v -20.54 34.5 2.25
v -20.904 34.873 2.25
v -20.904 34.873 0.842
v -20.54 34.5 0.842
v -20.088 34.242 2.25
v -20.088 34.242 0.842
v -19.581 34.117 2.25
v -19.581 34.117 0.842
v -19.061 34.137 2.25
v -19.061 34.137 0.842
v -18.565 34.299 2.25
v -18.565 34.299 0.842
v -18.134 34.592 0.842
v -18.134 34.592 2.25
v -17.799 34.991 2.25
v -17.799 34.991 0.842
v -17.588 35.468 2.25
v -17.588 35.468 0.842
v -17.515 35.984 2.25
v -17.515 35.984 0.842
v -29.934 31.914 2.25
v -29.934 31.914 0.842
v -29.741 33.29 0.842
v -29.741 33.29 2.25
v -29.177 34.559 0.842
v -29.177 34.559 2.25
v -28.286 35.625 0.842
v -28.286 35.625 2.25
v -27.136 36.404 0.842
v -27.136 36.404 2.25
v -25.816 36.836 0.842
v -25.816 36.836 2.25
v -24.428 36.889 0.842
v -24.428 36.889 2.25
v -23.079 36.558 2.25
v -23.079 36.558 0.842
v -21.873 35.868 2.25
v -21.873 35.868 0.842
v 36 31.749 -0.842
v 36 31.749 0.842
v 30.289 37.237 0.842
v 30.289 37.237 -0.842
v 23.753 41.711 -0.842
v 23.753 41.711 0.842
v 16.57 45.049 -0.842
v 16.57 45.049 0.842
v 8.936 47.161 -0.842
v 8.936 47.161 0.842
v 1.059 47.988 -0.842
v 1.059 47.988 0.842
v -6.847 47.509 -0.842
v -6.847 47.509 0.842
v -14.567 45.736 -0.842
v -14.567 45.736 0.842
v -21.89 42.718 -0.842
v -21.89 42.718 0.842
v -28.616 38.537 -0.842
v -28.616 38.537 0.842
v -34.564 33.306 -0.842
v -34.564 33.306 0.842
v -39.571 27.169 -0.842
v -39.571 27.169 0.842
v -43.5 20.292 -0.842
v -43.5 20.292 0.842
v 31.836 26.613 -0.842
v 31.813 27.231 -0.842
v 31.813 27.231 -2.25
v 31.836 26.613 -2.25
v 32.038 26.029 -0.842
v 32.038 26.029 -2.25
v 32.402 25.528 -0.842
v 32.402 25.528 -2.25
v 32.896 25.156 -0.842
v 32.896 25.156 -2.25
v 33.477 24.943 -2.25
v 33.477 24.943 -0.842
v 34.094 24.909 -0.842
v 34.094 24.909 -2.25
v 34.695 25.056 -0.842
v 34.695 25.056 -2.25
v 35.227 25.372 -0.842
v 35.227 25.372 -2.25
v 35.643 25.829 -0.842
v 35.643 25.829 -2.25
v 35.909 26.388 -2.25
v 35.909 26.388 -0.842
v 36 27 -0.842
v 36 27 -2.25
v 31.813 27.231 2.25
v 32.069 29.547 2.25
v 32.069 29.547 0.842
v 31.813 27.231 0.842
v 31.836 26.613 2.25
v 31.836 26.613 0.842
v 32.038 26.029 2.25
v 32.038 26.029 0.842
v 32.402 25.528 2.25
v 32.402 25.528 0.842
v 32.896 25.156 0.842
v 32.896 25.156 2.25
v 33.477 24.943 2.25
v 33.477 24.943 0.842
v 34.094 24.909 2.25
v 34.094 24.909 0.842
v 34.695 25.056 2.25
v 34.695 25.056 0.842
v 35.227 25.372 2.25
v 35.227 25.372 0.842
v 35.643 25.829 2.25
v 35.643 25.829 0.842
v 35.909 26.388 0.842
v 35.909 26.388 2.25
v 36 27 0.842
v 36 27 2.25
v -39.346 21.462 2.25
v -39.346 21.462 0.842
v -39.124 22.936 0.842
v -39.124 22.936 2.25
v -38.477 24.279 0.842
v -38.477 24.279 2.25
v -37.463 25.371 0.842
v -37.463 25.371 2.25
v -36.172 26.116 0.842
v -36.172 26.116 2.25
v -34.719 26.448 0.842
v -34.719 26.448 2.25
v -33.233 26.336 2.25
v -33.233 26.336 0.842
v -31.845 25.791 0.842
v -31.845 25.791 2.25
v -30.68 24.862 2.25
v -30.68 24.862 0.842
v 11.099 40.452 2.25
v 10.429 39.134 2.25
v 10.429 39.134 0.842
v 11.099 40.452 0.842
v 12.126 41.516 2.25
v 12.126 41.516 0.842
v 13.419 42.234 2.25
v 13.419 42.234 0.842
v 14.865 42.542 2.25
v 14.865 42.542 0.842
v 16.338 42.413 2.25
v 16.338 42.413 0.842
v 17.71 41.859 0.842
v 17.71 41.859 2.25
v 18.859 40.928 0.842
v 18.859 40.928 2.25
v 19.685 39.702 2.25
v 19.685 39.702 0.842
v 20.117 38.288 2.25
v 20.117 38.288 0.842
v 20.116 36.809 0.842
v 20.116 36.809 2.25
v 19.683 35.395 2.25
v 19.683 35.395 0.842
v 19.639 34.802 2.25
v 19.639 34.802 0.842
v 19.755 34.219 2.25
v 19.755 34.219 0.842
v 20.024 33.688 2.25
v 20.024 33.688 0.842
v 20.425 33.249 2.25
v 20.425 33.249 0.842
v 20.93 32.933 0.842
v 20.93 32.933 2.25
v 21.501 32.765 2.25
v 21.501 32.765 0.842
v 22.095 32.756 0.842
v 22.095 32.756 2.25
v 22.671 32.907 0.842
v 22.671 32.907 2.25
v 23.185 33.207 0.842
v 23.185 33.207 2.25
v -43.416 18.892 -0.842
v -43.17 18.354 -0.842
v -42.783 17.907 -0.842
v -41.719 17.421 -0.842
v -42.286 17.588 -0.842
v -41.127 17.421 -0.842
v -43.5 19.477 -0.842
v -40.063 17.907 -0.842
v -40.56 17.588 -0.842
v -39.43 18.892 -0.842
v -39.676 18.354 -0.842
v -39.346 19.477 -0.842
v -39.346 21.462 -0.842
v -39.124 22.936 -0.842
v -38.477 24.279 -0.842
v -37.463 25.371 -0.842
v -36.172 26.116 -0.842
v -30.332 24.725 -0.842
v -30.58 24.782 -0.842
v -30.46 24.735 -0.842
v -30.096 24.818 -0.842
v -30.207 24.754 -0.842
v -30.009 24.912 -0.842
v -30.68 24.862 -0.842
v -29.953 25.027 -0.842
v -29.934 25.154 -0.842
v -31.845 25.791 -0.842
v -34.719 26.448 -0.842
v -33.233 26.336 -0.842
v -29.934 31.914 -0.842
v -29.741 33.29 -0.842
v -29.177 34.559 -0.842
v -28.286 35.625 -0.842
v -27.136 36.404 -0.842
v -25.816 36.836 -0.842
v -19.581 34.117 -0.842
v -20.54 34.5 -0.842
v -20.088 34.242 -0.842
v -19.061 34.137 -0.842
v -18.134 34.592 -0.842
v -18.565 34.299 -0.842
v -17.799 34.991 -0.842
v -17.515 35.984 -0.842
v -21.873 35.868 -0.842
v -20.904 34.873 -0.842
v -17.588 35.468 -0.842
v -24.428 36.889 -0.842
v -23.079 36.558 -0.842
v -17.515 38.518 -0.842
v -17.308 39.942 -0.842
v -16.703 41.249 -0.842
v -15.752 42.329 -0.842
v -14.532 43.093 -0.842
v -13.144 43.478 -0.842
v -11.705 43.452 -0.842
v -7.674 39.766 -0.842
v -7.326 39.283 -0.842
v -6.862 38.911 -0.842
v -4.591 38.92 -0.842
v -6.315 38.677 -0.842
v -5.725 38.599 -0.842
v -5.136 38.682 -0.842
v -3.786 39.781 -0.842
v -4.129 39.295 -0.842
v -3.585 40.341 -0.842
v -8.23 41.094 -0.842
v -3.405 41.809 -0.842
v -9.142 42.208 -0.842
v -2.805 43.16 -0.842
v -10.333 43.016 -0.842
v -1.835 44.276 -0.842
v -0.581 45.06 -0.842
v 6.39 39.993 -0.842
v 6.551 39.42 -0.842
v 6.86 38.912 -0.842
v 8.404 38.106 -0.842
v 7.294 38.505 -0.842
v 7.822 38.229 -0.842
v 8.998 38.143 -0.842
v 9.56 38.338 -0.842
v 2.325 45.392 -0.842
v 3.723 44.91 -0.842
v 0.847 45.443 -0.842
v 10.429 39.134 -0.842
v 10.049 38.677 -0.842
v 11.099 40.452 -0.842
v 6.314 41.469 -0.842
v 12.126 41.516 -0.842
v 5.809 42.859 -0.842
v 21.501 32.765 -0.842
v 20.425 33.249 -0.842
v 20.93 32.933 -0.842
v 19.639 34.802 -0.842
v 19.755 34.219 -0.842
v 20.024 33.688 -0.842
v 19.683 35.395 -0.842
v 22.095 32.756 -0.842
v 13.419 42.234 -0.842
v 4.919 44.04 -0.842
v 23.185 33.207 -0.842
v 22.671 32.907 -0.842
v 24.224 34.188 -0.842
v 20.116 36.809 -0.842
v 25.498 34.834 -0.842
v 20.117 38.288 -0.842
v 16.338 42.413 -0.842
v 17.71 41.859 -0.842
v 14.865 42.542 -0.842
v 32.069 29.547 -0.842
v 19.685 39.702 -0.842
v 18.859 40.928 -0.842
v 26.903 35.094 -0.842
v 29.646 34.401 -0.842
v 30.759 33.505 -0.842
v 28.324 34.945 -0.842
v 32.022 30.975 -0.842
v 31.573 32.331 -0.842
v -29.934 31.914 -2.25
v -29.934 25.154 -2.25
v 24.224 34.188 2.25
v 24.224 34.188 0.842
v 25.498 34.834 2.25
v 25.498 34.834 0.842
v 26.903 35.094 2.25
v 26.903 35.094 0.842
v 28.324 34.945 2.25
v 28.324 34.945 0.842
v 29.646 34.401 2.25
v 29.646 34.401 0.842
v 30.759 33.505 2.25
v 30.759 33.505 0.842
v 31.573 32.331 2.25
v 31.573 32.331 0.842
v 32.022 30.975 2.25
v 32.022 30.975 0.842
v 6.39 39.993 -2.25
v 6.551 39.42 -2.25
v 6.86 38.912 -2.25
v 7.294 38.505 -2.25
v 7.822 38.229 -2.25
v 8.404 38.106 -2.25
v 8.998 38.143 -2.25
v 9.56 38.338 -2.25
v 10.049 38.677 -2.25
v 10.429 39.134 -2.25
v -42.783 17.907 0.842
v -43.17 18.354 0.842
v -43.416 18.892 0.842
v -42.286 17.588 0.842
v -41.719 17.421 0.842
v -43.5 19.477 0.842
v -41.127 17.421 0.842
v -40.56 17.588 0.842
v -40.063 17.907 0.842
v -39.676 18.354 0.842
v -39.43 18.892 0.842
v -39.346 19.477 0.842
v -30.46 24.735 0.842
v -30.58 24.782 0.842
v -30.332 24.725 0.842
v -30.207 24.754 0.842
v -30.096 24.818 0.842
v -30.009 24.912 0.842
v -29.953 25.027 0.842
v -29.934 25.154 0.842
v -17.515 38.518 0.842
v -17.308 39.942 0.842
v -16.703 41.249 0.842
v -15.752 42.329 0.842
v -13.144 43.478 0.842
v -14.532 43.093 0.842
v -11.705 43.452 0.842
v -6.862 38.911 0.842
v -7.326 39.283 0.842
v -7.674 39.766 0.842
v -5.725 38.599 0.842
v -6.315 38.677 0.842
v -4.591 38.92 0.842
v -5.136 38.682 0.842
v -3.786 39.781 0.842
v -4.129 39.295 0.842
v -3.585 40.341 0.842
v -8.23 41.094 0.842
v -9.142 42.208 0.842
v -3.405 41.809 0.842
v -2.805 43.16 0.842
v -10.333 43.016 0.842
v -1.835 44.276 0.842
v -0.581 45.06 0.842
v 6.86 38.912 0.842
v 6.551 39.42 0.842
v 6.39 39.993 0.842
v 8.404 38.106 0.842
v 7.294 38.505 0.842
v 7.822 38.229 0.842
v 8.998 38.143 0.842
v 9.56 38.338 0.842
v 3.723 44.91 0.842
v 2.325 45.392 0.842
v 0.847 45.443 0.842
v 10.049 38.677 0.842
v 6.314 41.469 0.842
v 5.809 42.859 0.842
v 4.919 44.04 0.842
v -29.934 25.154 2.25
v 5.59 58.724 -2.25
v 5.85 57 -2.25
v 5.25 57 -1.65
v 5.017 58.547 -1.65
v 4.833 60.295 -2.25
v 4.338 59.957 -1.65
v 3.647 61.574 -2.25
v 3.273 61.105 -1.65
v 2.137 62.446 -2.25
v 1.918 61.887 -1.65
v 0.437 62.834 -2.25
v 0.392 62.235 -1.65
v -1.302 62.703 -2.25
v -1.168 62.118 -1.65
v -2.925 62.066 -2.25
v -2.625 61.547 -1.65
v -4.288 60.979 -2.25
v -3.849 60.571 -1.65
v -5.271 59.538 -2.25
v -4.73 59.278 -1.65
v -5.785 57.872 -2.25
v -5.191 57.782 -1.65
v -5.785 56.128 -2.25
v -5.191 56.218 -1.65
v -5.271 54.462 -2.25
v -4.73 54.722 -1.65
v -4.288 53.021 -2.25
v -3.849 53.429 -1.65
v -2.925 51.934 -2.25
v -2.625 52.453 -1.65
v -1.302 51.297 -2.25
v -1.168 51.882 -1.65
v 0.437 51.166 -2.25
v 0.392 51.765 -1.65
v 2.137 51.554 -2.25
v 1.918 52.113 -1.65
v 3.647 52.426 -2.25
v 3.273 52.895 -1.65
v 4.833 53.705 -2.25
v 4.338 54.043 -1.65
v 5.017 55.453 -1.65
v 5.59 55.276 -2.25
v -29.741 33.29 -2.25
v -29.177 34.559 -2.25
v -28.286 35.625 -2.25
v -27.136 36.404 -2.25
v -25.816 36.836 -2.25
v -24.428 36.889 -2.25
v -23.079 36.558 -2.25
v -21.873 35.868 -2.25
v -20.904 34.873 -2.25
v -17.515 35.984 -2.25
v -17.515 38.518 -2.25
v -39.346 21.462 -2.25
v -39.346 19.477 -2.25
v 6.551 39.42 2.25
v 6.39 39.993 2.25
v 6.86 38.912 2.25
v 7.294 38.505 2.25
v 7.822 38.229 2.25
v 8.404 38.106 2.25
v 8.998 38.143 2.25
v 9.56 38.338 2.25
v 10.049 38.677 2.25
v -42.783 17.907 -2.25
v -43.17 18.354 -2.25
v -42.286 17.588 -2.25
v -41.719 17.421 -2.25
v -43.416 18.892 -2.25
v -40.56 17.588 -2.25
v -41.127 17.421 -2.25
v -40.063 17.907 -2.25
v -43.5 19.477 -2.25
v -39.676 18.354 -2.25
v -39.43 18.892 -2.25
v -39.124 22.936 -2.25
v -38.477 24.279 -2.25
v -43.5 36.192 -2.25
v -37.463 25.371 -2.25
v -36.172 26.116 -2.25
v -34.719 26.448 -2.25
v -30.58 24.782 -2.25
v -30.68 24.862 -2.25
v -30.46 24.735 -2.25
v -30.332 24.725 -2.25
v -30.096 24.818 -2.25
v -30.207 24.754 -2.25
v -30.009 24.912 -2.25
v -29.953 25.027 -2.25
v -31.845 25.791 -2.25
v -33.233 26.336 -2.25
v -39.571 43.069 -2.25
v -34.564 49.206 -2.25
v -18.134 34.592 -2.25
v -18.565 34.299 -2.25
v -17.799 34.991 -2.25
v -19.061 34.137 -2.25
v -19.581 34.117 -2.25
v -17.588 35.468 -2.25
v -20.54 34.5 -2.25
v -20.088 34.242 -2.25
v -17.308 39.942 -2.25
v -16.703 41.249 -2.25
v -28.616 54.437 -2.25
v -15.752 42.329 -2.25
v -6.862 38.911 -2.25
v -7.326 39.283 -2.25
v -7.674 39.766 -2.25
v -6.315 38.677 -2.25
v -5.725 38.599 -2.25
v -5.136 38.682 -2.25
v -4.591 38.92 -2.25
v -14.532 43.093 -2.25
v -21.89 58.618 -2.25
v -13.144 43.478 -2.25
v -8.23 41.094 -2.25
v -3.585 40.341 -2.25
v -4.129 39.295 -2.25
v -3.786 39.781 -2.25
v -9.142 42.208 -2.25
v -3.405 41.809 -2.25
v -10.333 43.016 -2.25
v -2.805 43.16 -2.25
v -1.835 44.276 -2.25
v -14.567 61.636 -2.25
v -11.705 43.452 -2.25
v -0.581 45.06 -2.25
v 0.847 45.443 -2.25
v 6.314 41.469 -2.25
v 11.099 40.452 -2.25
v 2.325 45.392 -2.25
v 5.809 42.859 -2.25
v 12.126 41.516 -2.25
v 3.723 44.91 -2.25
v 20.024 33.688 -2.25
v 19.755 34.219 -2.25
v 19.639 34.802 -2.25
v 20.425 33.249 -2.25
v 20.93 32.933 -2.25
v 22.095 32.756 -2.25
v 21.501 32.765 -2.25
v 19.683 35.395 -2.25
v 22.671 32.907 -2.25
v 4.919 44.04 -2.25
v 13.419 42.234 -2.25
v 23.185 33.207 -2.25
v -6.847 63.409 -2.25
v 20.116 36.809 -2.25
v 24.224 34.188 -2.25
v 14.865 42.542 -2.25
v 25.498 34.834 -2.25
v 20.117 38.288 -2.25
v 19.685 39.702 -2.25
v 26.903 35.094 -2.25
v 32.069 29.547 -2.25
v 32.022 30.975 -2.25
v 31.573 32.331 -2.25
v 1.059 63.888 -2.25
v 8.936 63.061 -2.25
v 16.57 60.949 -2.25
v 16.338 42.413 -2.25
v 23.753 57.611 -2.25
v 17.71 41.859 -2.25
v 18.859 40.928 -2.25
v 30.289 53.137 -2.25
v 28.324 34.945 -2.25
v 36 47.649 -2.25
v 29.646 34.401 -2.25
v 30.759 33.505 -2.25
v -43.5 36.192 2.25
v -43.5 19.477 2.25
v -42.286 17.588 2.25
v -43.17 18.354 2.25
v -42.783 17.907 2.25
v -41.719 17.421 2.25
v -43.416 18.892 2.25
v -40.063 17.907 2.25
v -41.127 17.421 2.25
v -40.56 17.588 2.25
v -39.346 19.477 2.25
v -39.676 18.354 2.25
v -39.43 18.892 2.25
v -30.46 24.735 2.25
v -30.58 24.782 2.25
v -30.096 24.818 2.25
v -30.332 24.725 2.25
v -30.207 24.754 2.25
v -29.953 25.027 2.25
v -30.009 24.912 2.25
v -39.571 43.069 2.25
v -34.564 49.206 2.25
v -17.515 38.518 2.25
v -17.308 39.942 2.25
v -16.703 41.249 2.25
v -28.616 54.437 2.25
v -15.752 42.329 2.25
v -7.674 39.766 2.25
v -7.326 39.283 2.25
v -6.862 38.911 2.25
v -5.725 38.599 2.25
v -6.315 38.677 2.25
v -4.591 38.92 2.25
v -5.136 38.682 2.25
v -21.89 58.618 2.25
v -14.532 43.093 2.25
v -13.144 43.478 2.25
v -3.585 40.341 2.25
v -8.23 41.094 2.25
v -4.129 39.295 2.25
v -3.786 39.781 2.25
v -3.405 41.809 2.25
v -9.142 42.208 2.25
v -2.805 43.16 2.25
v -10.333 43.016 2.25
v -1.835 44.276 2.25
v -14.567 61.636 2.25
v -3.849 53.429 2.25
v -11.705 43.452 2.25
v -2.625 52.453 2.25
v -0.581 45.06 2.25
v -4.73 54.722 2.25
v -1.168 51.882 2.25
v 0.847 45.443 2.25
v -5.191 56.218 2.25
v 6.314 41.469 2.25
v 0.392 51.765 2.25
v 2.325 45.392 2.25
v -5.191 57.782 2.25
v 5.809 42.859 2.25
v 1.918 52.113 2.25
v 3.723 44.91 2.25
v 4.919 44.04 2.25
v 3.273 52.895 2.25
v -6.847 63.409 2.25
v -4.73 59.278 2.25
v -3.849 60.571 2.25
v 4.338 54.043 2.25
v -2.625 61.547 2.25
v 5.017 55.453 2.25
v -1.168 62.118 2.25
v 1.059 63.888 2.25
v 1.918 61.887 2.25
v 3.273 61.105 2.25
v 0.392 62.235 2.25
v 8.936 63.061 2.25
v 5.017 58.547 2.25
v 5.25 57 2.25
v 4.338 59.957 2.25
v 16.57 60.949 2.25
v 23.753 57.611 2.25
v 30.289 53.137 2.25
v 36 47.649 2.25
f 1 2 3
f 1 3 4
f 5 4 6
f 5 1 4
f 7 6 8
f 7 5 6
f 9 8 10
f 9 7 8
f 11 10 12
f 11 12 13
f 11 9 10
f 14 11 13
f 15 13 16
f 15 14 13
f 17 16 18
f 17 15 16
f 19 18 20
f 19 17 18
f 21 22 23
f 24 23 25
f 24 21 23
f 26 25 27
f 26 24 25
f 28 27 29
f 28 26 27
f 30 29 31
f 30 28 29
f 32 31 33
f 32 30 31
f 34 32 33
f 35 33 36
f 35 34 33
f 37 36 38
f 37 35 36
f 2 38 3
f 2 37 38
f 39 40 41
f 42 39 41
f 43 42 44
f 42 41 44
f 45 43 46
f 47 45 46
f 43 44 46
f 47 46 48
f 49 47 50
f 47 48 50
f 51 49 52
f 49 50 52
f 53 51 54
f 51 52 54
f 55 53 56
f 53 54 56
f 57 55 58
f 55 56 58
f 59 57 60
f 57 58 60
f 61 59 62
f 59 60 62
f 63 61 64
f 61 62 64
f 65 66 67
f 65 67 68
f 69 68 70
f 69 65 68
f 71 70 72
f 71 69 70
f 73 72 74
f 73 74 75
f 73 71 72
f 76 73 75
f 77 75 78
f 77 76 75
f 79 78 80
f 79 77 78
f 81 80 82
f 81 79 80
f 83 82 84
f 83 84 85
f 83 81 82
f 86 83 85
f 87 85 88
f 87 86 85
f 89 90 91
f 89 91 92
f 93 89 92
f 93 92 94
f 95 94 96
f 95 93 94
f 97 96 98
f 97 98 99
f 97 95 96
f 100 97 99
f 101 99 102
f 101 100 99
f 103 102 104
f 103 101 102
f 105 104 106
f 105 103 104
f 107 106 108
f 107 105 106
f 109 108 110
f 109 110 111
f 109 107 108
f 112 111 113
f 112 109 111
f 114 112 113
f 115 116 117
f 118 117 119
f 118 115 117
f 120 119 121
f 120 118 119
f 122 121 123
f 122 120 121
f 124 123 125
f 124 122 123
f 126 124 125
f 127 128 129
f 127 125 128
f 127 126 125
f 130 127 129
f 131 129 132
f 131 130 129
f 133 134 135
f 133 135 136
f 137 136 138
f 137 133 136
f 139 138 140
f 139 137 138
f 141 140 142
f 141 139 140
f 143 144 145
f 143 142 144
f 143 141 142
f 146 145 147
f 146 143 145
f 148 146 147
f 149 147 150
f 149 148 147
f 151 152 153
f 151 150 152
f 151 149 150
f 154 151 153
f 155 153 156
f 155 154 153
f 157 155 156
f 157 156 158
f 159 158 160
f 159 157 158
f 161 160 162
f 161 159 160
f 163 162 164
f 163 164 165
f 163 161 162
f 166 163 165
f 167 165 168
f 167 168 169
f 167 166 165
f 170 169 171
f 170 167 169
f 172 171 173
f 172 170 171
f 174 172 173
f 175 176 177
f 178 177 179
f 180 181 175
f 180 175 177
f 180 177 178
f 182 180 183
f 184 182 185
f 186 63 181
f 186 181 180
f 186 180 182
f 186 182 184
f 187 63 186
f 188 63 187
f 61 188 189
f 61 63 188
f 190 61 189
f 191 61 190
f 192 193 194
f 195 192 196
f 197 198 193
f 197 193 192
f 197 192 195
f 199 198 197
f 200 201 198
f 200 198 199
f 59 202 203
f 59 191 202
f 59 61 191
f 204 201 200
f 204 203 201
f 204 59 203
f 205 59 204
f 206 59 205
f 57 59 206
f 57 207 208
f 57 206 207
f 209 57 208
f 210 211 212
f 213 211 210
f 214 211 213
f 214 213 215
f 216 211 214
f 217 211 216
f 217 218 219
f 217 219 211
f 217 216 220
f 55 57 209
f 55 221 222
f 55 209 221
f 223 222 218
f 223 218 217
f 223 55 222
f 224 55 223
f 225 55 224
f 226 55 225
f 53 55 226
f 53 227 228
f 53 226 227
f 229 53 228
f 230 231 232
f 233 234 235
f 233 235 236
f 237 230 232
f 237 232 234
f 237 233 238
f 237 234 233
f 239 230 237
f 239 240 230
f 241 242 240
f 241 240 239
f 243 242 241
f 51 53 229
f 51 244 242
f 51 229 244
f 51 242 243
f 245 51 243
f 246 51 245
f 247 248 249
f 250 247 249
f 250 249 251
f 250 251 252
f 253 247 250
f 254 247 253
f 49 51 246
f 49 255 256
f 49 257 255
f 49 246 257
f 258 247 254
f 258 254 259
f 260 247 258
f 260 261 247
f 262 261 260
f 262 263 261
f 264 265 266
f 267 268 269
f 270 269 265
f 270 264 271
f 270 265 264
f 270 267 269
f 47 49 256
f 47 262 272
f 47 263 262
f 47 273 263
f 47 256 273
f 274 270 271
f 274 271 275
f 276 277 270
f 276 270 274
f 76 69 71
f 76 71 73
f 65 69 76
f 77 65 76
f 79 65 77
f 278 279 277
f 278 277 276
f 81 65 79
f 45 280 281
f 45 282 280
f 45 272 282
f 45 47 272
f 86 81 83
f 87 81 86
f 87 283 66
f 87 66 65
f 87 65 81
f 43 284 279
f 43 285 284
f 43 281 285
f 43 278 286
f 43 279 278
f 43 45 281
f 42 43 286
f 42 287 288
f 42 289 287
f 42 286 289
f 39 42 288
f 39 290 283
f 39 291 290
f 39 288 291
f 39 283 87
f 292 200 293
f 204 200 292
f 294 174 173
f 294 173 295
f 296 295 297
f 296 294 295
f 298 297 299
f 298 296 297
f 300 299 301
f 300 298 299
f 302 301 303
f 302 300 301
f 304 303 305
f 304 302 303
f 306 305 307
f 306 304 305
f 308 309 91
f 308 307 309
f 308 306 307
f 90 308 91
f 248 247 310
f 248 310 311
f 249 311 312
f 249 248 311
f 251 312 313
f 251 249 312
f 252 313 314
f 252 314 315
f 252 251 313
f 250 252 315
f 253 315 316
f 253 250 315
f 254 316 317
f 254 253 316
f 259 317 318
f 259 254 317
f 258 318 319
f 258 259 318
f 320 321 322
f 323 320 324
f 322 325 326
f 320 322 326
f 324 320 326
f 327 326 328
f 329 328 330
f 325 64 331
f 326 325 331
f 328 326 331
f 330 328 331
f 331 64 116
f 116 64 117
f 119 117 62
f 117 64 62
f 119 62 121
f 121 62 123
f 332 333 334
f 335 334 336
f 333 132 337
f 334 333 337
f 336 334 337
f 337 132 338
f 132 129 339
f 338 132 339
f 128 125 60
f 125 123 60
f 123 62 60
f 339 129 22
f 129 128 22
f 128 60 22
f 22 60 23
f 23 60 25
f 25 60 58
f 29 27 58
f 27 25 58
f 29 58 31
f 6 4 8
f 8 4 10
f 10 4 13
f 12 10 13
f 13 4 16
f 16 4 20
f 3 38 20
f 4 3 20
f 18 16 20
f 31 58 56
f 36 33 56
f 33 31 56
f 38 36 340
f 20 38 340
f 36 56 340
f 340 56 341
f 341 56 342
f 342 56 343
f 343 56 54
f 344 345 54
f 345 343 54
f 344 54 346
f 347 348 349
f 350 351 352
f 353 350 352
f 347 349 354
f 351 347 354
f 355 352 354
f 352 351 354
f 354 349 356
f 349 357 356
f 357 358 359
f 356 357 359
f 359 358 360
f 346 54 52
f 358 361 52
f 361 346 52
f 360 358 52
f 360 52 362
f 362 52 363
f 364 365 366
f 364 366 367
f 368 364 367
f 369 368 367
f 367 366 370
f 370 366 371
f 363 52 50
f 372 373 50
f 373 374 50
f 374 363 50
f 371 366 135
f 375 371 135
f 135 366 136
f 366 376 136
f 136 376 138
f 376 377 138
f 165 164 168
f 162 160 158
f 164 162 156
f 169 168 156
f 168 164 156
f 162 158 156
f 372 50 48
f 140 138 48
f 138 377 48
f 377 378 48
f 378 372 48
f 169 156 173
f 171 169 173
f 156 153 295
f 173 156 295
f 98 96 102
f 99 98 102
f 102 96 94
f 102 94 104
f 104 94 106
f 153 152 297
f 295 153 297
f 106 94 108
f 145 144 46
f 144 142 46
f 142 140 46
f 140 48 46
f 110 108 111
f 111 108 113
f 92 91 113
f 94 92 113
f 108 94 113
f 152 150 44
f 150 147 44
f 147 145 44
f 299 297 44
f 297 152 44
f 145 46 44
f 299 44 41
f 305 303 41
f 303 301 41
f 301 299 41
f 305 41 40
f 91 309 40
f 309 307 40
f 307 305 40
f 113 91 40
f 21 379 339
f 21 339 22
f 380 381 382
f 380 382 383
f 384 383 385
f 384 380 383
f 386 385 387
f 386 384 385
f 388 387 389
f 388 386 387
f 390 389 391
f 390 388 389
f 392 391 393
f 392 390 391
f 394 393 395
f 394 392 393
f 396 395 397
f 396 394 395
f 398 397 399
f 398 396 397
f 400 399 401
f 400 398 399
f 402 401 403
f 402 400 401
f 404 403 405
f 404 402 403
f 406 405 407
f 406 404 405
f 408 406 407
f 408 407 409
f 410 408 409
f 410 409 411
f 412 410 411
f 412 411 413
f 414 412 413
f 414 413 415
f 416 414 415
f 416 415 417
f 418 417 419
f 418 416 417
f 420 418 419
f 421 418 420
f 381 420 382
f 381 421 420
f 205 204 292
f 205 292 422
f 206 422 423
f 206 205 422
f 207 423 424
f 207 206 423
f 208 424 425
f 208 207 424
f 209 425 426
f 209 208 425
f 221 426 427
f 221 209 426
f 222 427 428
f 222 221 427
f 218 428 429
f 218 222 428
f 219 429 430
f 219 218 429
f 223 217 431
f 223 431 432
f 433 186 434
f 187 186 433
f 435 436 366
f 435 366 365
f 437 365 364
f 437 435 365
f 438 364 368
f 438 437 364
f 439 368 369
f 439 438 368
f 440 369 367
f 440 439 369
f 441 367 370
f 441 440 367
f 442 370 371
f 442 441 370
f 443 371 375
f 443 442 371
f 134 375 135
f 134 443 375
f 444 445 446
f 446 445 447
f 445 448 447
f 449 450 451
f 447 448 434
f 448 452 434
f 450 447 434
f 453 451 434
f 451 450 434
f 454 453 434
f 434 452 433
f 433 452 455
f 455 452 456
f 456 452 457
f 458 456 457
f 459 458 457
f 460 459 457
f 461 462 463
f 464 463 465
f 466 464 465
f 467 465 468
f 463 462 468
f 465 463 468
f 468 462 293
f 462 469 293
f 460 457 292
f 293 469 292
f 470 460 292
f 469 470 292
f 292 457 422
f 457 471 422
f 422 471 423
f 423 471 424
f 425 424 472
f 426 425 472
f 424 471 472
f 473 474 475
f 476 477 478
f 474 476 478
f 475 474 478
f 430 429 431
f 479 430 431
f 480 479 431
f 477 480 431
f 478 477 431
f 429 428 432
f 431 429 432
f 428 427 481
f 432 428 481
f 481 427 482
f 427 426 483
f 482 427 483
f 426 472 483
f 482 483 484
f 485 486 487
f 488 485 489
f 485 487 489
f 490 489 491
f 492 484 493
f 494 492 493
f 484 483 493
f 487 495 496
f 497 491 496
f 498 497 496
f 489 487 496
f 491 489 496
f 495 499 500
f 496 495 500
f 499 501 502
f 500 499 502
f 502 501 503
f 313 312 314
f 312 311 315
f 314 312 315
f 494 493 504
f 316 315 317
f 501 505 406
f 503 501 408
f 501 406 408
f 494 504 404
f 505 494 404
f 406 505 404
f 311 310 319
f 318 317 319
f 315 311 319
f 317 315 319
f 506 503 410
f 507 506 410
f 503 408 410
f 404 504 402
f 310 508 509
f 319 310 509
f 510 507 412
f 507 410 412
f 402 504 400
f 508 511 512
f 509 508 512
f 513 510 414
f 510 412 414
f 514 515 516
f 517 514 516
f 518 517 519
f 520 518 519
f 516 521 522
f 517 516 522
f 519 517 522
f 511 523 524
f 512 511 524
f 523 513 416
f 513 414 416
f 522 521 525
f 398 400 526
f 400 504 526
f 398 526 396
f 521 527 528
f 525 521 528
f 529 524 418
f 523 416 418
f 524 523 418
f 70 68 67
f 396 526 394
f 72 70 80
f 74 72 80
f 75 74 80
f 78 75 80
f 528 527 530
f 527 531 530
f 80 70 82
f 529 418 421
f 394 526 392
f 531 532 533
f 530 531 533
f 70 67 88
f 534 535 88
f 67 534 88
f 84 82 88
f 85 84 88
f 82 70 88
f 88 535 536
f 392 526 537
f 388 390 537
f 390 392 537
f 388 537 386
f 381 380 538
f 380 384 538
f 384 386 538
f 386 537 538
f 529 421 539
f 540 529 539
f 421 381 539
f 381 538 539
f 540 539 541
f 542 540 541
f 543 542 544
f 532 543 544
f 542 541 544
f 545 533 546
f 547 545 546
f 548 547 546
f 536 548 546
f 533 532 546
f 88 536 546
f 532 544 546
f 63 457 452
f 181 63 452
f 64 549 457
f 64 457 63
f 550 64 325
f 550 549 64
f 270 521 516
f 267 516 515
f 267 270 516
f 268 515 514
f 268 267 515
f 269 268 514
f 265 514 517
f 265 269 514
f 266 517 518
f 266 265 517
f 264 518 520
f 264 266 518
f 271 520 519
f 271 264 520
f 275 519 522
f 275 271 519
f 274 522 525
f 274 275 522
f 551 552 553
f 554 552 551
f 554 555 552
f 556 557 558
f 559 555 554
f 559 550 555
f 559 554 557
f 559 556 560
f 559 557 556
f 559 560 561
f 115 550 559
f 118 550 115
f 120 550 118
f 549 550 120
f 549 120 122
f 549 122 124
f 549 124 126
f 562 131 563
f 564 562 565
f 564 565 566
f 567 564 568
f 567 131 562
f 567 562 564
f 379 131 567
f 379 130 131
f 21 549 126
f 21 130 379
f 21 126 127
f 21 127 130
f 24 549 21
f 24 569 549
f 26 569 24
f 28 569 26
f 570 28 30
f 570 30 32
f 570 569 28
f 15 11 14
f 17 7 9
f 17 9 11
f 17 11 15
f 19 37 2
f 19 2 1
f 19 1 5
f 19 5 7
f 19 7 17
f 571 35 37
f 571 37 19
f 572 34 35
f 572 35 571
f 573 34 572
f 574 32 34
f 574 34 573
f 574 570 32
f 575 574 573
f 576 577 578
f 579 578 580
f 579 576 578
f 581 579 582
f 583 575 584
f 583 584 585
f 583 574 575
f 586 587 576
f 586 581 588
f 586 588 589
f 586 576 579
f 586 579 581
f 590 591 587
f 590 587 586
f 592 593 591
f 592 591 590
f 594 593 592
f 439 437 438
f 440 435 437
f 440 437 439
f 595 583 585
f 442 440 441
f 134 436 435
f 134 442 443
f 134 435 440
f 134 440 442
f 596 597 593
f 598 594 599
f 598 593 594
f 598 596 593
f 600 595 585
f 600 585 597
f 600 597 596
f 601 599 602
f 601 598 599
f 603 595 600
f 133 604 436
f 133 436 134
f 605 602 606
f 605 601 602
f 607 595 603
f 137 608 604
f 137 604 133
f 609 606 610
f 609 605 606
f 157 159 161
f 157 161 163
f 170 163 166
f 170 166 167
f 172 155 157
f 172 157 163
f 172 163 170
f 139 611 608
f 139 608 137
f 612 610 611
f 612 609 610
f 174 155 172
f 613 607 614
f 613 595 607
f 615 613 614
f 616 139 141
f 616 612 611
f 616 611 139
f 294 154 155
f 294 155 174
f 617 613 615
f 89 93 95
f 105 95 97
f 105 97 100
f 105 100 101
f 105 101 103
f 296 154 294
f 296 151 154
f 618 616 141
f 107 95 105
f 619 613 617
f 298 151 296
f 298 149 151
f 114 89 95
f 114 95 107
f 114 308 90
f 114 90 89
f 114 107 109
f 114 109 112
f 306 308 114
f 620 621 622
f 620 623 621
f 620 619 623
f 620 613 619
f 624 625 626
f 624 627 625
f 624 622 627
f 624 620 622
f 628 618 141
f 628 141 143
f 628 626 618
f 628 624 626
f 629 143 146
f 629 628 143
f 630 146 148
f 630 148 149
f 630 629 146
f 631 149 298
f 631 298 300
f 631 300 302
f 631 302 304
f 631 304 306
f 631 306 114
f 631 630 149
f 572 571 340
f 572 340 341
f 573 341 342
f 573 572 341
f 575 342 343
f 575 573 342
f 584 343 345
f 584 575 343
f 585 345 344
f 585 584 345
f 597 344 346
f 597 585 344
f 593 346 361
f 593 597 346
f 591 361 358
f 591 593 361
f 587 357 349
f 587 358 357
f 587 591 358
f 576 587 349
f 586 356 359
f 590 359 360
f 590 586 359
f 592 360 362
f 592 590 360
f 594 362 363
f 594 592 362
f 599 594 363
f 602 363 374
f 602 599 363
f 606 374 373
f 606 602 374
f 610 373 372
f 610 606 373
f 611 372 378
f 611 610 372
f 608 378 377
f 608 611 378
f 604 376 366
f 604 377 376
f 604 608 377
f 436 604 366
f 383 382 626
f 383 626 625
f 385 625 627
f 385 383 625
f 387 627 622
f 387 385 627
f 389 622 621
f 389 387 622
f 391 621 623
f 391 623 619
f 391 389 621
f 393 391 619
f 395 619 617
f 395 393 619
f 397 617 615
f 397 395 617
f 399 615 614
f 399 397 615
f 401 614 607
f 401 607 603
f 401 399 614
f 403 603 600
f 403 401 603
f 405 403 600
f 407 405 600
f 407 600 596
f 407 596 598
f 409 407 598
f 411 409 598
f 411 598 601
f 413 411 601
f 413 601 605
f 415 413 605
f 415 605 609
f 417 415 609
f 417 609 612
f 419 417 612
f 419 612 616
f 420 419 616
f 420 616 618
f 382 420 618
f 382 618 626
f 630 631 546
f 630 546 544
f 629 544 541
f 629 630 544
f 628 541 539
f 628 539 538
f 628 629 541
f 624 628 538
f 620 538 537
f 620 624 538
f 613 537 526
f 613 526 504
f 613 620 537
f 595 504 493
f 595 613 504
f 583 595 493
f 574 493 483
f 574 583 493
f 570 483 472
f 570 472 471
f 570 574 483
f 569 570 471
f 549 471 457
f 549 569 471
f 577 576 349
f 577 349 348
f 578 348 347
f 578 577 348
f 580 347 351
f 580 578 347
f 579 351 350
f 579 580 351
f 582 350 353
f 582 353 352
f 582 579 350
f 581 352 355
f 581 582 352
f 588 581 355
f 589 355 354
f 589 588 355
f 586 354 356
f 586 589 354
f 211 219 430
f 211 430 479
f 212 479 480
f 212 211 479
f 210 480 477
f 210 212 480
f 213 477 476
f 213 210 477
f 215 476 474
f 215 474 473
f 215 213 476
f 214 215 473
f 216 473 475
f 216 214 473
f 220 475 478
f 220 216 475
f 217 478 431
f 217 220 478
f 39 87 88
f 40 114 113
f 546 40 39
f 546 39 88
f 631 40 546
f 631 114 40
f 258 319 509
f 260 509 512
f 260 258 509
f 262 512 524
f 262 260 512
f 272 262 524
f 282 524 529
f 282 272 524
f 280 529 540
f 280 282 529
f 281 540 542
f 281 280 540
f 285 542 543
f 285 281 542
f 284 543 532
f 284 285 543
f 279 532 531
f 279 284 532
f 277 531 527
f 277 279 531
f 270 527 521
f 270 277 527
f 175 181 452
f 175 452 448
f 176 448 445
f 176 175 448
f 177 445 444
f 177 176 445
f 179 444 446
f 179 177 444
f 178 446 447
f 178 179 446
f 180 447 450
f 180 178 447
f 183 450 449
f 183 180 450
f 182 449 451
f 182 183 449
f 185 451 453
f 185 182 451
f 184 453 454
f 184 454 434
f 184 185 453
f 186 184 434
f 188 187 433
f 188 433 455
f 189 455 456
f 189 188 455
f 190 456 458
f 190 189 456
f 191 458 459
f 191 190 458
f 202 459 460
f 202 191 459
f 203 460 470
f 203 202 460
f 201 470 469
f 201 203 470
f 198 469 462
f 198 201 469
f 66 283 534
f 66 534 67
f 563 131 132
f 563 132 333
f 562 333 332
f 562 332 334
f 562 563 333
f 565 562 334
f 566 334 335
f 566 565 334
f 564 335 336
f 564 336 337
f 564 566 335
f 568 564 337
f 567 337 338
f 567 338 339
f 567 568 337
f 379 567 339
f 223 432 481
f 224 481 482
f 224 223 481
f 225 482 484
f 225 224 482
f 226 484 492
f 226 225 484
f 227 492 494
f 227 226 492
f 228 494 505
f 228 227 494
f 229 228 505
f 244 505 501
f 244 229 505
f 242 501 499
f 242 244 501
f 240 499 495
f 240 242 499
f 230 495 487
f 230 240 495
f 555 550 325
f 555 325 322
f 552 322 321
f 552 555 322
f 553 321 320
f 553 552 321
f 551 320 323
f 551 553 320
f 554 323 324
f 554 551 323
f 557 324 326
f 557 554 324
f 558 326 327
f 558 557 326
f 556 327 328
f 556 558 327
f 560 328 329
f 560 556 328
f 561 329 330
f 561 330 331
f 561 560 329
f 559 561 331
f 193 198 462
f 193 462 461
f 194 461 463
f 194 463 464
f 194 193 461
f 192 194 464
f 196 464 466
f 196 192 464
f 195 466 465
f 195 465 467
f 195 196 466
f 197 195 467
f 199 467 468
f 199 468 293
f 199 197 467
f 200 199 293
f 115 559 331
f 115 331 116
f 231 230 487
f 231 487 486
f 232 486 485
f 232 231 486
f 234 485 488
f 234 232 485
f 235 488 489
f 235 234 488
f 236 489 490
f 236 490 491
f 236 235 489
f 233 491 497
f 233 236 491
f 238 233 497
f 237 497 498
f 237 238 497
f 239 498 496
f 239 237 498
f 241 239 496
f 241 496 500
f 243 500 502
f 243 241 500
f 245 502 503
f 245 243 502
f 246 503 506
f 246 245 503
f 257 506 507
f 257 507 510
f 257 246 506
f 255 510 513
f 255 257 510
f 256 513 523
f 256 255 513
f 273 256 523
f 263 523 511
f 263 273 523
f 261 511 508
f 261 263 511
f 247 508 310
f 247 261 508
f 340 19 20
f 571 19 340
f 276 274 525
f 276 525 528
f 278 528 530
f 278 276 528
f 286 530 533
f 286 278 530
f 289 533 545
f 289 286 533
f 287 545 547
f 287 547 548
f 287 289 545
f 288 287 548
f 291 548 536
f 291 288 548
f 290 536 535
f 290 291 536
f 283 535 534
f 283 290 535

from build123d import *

# Parameters (mm, degrees)
F0_R     = 1.75
F1_DEPTH = 0.75
F2_SIZE  = 0.2
F3_R     = 16
F4_DEPTH = 0.2808333333
F5_SCALE = 3


with BuildPart() as f1:
    # F0 (on Top) → F1 (new body, symmetric)
    with BuildSketch(Plane.XY):
        with BuildLine():
            ThreePointArc((-1.1949222327, 13.4470130831), (0.5293090333, 15.1574275431), (2.1300276773, 13.3309032738))
            ThreePointArc((2.1300276773, 13.3309032738), (2.7028519806, 12.7159188095), (3.4762897375, 13.0447464391))
            ThreePointArc((3.4762897375, 13.0447464391), (5.6815333335, 14.0622884609), (6.5610087387, 11.7984390633))
            ThreePointArc((6.5610087387, 11.7984390633), (6.888950435, 11.02462525), (7.7282098608, 11.0690908546))
            ThreePointArc((7.7282098608, 11.0690908546), (9.6681759929, 11.5734494675), (10.6897886008, 9.8488759309))
            Line((10.6897886008, 9.8488759309), (10.6042593257, 9.0771032695))
            ThreePointArc((10.6042593257, 9.0771032695), (11.2613895868, 8.3010656426), (12, 9))
            Line((12, 9), (12, 15.8830052443))
            ThreePointArc((12, 15.8830052443), (-2.2823101594, 21.1363840676), (-14.5, 12.0638746292))
            Line((-14.5, 12.0638746292), (-14.5, 6.4923420176))
            ThreePointArc((-14.5, 6.4923420176), (-13.8076579824, 5.8), (-13.1153159648, 6.4923420176))
            Line((-13.1153159648, 6.4923420176), (-13.1153159648, 7.1539100671))
            ThreePointArc((-13.1153159648, 7.1539100671), (-12.0573735414, 8.7054359527), (-10.2266368767, 8.2872517719))
            ThreePointArc((-10.2266368767, 8.2872517719), (-10.0691213433, 8.2512714446), (-9.9780965836, 8.3847638426))
            Line((-9.9780965836, 8.3847638426), (-9.9780965836, 10.6381451737))
            ThreePointArc((-9.9780965836, 10.6381451737), (-8.8304088419, 12.2219502921), (-6.9679701997, 11.624498947))
            ThreePointArc((-6.9679701997, 11.624498947), (-6.2690751364, 11.4003005298), (-5.8383960907, 11.9946361248))
            Line((-5.8383960907, 11.9946361248), (-5.8383960907, 12.83926297))
            ThreePointArc((-5.8383960907, 12.83926297), (-4.3814979484, 14.4926760896), (-2.557866158, 13.2554638062))
            ThreePointArc((-2.557866158, 13.2554638062), (-1.8092503125, 12.8734848936), (-1.1949222327, 13.4470130831))
        make_face()
        with Locations((0, 19)):
            Circle(F0_R, mode=Mode.SUBTRACT)
    extrude(amount=F1_DEPTH, both=True)

    # F2
    f2_edges = [f1.edges().sort_by_distance(p)[0] for p in [
        (-1.75, 19, -0.75),
    ]]
    chamfer(f2_edges, length=F2_SIZE)

    # F3 (on Top) → F4 (cut, symmetric)
    with BuildSketch(Plane.XY):
        Circle(F3_R)
    extrude(amount=F4_DEPTH, both=True, mode=Mode.SUBTRACT)


with BuildPart() as f1_1:
    # F5: moved
    add(f1.part.scale(F5_SCALE))


solid = f1_1.part
